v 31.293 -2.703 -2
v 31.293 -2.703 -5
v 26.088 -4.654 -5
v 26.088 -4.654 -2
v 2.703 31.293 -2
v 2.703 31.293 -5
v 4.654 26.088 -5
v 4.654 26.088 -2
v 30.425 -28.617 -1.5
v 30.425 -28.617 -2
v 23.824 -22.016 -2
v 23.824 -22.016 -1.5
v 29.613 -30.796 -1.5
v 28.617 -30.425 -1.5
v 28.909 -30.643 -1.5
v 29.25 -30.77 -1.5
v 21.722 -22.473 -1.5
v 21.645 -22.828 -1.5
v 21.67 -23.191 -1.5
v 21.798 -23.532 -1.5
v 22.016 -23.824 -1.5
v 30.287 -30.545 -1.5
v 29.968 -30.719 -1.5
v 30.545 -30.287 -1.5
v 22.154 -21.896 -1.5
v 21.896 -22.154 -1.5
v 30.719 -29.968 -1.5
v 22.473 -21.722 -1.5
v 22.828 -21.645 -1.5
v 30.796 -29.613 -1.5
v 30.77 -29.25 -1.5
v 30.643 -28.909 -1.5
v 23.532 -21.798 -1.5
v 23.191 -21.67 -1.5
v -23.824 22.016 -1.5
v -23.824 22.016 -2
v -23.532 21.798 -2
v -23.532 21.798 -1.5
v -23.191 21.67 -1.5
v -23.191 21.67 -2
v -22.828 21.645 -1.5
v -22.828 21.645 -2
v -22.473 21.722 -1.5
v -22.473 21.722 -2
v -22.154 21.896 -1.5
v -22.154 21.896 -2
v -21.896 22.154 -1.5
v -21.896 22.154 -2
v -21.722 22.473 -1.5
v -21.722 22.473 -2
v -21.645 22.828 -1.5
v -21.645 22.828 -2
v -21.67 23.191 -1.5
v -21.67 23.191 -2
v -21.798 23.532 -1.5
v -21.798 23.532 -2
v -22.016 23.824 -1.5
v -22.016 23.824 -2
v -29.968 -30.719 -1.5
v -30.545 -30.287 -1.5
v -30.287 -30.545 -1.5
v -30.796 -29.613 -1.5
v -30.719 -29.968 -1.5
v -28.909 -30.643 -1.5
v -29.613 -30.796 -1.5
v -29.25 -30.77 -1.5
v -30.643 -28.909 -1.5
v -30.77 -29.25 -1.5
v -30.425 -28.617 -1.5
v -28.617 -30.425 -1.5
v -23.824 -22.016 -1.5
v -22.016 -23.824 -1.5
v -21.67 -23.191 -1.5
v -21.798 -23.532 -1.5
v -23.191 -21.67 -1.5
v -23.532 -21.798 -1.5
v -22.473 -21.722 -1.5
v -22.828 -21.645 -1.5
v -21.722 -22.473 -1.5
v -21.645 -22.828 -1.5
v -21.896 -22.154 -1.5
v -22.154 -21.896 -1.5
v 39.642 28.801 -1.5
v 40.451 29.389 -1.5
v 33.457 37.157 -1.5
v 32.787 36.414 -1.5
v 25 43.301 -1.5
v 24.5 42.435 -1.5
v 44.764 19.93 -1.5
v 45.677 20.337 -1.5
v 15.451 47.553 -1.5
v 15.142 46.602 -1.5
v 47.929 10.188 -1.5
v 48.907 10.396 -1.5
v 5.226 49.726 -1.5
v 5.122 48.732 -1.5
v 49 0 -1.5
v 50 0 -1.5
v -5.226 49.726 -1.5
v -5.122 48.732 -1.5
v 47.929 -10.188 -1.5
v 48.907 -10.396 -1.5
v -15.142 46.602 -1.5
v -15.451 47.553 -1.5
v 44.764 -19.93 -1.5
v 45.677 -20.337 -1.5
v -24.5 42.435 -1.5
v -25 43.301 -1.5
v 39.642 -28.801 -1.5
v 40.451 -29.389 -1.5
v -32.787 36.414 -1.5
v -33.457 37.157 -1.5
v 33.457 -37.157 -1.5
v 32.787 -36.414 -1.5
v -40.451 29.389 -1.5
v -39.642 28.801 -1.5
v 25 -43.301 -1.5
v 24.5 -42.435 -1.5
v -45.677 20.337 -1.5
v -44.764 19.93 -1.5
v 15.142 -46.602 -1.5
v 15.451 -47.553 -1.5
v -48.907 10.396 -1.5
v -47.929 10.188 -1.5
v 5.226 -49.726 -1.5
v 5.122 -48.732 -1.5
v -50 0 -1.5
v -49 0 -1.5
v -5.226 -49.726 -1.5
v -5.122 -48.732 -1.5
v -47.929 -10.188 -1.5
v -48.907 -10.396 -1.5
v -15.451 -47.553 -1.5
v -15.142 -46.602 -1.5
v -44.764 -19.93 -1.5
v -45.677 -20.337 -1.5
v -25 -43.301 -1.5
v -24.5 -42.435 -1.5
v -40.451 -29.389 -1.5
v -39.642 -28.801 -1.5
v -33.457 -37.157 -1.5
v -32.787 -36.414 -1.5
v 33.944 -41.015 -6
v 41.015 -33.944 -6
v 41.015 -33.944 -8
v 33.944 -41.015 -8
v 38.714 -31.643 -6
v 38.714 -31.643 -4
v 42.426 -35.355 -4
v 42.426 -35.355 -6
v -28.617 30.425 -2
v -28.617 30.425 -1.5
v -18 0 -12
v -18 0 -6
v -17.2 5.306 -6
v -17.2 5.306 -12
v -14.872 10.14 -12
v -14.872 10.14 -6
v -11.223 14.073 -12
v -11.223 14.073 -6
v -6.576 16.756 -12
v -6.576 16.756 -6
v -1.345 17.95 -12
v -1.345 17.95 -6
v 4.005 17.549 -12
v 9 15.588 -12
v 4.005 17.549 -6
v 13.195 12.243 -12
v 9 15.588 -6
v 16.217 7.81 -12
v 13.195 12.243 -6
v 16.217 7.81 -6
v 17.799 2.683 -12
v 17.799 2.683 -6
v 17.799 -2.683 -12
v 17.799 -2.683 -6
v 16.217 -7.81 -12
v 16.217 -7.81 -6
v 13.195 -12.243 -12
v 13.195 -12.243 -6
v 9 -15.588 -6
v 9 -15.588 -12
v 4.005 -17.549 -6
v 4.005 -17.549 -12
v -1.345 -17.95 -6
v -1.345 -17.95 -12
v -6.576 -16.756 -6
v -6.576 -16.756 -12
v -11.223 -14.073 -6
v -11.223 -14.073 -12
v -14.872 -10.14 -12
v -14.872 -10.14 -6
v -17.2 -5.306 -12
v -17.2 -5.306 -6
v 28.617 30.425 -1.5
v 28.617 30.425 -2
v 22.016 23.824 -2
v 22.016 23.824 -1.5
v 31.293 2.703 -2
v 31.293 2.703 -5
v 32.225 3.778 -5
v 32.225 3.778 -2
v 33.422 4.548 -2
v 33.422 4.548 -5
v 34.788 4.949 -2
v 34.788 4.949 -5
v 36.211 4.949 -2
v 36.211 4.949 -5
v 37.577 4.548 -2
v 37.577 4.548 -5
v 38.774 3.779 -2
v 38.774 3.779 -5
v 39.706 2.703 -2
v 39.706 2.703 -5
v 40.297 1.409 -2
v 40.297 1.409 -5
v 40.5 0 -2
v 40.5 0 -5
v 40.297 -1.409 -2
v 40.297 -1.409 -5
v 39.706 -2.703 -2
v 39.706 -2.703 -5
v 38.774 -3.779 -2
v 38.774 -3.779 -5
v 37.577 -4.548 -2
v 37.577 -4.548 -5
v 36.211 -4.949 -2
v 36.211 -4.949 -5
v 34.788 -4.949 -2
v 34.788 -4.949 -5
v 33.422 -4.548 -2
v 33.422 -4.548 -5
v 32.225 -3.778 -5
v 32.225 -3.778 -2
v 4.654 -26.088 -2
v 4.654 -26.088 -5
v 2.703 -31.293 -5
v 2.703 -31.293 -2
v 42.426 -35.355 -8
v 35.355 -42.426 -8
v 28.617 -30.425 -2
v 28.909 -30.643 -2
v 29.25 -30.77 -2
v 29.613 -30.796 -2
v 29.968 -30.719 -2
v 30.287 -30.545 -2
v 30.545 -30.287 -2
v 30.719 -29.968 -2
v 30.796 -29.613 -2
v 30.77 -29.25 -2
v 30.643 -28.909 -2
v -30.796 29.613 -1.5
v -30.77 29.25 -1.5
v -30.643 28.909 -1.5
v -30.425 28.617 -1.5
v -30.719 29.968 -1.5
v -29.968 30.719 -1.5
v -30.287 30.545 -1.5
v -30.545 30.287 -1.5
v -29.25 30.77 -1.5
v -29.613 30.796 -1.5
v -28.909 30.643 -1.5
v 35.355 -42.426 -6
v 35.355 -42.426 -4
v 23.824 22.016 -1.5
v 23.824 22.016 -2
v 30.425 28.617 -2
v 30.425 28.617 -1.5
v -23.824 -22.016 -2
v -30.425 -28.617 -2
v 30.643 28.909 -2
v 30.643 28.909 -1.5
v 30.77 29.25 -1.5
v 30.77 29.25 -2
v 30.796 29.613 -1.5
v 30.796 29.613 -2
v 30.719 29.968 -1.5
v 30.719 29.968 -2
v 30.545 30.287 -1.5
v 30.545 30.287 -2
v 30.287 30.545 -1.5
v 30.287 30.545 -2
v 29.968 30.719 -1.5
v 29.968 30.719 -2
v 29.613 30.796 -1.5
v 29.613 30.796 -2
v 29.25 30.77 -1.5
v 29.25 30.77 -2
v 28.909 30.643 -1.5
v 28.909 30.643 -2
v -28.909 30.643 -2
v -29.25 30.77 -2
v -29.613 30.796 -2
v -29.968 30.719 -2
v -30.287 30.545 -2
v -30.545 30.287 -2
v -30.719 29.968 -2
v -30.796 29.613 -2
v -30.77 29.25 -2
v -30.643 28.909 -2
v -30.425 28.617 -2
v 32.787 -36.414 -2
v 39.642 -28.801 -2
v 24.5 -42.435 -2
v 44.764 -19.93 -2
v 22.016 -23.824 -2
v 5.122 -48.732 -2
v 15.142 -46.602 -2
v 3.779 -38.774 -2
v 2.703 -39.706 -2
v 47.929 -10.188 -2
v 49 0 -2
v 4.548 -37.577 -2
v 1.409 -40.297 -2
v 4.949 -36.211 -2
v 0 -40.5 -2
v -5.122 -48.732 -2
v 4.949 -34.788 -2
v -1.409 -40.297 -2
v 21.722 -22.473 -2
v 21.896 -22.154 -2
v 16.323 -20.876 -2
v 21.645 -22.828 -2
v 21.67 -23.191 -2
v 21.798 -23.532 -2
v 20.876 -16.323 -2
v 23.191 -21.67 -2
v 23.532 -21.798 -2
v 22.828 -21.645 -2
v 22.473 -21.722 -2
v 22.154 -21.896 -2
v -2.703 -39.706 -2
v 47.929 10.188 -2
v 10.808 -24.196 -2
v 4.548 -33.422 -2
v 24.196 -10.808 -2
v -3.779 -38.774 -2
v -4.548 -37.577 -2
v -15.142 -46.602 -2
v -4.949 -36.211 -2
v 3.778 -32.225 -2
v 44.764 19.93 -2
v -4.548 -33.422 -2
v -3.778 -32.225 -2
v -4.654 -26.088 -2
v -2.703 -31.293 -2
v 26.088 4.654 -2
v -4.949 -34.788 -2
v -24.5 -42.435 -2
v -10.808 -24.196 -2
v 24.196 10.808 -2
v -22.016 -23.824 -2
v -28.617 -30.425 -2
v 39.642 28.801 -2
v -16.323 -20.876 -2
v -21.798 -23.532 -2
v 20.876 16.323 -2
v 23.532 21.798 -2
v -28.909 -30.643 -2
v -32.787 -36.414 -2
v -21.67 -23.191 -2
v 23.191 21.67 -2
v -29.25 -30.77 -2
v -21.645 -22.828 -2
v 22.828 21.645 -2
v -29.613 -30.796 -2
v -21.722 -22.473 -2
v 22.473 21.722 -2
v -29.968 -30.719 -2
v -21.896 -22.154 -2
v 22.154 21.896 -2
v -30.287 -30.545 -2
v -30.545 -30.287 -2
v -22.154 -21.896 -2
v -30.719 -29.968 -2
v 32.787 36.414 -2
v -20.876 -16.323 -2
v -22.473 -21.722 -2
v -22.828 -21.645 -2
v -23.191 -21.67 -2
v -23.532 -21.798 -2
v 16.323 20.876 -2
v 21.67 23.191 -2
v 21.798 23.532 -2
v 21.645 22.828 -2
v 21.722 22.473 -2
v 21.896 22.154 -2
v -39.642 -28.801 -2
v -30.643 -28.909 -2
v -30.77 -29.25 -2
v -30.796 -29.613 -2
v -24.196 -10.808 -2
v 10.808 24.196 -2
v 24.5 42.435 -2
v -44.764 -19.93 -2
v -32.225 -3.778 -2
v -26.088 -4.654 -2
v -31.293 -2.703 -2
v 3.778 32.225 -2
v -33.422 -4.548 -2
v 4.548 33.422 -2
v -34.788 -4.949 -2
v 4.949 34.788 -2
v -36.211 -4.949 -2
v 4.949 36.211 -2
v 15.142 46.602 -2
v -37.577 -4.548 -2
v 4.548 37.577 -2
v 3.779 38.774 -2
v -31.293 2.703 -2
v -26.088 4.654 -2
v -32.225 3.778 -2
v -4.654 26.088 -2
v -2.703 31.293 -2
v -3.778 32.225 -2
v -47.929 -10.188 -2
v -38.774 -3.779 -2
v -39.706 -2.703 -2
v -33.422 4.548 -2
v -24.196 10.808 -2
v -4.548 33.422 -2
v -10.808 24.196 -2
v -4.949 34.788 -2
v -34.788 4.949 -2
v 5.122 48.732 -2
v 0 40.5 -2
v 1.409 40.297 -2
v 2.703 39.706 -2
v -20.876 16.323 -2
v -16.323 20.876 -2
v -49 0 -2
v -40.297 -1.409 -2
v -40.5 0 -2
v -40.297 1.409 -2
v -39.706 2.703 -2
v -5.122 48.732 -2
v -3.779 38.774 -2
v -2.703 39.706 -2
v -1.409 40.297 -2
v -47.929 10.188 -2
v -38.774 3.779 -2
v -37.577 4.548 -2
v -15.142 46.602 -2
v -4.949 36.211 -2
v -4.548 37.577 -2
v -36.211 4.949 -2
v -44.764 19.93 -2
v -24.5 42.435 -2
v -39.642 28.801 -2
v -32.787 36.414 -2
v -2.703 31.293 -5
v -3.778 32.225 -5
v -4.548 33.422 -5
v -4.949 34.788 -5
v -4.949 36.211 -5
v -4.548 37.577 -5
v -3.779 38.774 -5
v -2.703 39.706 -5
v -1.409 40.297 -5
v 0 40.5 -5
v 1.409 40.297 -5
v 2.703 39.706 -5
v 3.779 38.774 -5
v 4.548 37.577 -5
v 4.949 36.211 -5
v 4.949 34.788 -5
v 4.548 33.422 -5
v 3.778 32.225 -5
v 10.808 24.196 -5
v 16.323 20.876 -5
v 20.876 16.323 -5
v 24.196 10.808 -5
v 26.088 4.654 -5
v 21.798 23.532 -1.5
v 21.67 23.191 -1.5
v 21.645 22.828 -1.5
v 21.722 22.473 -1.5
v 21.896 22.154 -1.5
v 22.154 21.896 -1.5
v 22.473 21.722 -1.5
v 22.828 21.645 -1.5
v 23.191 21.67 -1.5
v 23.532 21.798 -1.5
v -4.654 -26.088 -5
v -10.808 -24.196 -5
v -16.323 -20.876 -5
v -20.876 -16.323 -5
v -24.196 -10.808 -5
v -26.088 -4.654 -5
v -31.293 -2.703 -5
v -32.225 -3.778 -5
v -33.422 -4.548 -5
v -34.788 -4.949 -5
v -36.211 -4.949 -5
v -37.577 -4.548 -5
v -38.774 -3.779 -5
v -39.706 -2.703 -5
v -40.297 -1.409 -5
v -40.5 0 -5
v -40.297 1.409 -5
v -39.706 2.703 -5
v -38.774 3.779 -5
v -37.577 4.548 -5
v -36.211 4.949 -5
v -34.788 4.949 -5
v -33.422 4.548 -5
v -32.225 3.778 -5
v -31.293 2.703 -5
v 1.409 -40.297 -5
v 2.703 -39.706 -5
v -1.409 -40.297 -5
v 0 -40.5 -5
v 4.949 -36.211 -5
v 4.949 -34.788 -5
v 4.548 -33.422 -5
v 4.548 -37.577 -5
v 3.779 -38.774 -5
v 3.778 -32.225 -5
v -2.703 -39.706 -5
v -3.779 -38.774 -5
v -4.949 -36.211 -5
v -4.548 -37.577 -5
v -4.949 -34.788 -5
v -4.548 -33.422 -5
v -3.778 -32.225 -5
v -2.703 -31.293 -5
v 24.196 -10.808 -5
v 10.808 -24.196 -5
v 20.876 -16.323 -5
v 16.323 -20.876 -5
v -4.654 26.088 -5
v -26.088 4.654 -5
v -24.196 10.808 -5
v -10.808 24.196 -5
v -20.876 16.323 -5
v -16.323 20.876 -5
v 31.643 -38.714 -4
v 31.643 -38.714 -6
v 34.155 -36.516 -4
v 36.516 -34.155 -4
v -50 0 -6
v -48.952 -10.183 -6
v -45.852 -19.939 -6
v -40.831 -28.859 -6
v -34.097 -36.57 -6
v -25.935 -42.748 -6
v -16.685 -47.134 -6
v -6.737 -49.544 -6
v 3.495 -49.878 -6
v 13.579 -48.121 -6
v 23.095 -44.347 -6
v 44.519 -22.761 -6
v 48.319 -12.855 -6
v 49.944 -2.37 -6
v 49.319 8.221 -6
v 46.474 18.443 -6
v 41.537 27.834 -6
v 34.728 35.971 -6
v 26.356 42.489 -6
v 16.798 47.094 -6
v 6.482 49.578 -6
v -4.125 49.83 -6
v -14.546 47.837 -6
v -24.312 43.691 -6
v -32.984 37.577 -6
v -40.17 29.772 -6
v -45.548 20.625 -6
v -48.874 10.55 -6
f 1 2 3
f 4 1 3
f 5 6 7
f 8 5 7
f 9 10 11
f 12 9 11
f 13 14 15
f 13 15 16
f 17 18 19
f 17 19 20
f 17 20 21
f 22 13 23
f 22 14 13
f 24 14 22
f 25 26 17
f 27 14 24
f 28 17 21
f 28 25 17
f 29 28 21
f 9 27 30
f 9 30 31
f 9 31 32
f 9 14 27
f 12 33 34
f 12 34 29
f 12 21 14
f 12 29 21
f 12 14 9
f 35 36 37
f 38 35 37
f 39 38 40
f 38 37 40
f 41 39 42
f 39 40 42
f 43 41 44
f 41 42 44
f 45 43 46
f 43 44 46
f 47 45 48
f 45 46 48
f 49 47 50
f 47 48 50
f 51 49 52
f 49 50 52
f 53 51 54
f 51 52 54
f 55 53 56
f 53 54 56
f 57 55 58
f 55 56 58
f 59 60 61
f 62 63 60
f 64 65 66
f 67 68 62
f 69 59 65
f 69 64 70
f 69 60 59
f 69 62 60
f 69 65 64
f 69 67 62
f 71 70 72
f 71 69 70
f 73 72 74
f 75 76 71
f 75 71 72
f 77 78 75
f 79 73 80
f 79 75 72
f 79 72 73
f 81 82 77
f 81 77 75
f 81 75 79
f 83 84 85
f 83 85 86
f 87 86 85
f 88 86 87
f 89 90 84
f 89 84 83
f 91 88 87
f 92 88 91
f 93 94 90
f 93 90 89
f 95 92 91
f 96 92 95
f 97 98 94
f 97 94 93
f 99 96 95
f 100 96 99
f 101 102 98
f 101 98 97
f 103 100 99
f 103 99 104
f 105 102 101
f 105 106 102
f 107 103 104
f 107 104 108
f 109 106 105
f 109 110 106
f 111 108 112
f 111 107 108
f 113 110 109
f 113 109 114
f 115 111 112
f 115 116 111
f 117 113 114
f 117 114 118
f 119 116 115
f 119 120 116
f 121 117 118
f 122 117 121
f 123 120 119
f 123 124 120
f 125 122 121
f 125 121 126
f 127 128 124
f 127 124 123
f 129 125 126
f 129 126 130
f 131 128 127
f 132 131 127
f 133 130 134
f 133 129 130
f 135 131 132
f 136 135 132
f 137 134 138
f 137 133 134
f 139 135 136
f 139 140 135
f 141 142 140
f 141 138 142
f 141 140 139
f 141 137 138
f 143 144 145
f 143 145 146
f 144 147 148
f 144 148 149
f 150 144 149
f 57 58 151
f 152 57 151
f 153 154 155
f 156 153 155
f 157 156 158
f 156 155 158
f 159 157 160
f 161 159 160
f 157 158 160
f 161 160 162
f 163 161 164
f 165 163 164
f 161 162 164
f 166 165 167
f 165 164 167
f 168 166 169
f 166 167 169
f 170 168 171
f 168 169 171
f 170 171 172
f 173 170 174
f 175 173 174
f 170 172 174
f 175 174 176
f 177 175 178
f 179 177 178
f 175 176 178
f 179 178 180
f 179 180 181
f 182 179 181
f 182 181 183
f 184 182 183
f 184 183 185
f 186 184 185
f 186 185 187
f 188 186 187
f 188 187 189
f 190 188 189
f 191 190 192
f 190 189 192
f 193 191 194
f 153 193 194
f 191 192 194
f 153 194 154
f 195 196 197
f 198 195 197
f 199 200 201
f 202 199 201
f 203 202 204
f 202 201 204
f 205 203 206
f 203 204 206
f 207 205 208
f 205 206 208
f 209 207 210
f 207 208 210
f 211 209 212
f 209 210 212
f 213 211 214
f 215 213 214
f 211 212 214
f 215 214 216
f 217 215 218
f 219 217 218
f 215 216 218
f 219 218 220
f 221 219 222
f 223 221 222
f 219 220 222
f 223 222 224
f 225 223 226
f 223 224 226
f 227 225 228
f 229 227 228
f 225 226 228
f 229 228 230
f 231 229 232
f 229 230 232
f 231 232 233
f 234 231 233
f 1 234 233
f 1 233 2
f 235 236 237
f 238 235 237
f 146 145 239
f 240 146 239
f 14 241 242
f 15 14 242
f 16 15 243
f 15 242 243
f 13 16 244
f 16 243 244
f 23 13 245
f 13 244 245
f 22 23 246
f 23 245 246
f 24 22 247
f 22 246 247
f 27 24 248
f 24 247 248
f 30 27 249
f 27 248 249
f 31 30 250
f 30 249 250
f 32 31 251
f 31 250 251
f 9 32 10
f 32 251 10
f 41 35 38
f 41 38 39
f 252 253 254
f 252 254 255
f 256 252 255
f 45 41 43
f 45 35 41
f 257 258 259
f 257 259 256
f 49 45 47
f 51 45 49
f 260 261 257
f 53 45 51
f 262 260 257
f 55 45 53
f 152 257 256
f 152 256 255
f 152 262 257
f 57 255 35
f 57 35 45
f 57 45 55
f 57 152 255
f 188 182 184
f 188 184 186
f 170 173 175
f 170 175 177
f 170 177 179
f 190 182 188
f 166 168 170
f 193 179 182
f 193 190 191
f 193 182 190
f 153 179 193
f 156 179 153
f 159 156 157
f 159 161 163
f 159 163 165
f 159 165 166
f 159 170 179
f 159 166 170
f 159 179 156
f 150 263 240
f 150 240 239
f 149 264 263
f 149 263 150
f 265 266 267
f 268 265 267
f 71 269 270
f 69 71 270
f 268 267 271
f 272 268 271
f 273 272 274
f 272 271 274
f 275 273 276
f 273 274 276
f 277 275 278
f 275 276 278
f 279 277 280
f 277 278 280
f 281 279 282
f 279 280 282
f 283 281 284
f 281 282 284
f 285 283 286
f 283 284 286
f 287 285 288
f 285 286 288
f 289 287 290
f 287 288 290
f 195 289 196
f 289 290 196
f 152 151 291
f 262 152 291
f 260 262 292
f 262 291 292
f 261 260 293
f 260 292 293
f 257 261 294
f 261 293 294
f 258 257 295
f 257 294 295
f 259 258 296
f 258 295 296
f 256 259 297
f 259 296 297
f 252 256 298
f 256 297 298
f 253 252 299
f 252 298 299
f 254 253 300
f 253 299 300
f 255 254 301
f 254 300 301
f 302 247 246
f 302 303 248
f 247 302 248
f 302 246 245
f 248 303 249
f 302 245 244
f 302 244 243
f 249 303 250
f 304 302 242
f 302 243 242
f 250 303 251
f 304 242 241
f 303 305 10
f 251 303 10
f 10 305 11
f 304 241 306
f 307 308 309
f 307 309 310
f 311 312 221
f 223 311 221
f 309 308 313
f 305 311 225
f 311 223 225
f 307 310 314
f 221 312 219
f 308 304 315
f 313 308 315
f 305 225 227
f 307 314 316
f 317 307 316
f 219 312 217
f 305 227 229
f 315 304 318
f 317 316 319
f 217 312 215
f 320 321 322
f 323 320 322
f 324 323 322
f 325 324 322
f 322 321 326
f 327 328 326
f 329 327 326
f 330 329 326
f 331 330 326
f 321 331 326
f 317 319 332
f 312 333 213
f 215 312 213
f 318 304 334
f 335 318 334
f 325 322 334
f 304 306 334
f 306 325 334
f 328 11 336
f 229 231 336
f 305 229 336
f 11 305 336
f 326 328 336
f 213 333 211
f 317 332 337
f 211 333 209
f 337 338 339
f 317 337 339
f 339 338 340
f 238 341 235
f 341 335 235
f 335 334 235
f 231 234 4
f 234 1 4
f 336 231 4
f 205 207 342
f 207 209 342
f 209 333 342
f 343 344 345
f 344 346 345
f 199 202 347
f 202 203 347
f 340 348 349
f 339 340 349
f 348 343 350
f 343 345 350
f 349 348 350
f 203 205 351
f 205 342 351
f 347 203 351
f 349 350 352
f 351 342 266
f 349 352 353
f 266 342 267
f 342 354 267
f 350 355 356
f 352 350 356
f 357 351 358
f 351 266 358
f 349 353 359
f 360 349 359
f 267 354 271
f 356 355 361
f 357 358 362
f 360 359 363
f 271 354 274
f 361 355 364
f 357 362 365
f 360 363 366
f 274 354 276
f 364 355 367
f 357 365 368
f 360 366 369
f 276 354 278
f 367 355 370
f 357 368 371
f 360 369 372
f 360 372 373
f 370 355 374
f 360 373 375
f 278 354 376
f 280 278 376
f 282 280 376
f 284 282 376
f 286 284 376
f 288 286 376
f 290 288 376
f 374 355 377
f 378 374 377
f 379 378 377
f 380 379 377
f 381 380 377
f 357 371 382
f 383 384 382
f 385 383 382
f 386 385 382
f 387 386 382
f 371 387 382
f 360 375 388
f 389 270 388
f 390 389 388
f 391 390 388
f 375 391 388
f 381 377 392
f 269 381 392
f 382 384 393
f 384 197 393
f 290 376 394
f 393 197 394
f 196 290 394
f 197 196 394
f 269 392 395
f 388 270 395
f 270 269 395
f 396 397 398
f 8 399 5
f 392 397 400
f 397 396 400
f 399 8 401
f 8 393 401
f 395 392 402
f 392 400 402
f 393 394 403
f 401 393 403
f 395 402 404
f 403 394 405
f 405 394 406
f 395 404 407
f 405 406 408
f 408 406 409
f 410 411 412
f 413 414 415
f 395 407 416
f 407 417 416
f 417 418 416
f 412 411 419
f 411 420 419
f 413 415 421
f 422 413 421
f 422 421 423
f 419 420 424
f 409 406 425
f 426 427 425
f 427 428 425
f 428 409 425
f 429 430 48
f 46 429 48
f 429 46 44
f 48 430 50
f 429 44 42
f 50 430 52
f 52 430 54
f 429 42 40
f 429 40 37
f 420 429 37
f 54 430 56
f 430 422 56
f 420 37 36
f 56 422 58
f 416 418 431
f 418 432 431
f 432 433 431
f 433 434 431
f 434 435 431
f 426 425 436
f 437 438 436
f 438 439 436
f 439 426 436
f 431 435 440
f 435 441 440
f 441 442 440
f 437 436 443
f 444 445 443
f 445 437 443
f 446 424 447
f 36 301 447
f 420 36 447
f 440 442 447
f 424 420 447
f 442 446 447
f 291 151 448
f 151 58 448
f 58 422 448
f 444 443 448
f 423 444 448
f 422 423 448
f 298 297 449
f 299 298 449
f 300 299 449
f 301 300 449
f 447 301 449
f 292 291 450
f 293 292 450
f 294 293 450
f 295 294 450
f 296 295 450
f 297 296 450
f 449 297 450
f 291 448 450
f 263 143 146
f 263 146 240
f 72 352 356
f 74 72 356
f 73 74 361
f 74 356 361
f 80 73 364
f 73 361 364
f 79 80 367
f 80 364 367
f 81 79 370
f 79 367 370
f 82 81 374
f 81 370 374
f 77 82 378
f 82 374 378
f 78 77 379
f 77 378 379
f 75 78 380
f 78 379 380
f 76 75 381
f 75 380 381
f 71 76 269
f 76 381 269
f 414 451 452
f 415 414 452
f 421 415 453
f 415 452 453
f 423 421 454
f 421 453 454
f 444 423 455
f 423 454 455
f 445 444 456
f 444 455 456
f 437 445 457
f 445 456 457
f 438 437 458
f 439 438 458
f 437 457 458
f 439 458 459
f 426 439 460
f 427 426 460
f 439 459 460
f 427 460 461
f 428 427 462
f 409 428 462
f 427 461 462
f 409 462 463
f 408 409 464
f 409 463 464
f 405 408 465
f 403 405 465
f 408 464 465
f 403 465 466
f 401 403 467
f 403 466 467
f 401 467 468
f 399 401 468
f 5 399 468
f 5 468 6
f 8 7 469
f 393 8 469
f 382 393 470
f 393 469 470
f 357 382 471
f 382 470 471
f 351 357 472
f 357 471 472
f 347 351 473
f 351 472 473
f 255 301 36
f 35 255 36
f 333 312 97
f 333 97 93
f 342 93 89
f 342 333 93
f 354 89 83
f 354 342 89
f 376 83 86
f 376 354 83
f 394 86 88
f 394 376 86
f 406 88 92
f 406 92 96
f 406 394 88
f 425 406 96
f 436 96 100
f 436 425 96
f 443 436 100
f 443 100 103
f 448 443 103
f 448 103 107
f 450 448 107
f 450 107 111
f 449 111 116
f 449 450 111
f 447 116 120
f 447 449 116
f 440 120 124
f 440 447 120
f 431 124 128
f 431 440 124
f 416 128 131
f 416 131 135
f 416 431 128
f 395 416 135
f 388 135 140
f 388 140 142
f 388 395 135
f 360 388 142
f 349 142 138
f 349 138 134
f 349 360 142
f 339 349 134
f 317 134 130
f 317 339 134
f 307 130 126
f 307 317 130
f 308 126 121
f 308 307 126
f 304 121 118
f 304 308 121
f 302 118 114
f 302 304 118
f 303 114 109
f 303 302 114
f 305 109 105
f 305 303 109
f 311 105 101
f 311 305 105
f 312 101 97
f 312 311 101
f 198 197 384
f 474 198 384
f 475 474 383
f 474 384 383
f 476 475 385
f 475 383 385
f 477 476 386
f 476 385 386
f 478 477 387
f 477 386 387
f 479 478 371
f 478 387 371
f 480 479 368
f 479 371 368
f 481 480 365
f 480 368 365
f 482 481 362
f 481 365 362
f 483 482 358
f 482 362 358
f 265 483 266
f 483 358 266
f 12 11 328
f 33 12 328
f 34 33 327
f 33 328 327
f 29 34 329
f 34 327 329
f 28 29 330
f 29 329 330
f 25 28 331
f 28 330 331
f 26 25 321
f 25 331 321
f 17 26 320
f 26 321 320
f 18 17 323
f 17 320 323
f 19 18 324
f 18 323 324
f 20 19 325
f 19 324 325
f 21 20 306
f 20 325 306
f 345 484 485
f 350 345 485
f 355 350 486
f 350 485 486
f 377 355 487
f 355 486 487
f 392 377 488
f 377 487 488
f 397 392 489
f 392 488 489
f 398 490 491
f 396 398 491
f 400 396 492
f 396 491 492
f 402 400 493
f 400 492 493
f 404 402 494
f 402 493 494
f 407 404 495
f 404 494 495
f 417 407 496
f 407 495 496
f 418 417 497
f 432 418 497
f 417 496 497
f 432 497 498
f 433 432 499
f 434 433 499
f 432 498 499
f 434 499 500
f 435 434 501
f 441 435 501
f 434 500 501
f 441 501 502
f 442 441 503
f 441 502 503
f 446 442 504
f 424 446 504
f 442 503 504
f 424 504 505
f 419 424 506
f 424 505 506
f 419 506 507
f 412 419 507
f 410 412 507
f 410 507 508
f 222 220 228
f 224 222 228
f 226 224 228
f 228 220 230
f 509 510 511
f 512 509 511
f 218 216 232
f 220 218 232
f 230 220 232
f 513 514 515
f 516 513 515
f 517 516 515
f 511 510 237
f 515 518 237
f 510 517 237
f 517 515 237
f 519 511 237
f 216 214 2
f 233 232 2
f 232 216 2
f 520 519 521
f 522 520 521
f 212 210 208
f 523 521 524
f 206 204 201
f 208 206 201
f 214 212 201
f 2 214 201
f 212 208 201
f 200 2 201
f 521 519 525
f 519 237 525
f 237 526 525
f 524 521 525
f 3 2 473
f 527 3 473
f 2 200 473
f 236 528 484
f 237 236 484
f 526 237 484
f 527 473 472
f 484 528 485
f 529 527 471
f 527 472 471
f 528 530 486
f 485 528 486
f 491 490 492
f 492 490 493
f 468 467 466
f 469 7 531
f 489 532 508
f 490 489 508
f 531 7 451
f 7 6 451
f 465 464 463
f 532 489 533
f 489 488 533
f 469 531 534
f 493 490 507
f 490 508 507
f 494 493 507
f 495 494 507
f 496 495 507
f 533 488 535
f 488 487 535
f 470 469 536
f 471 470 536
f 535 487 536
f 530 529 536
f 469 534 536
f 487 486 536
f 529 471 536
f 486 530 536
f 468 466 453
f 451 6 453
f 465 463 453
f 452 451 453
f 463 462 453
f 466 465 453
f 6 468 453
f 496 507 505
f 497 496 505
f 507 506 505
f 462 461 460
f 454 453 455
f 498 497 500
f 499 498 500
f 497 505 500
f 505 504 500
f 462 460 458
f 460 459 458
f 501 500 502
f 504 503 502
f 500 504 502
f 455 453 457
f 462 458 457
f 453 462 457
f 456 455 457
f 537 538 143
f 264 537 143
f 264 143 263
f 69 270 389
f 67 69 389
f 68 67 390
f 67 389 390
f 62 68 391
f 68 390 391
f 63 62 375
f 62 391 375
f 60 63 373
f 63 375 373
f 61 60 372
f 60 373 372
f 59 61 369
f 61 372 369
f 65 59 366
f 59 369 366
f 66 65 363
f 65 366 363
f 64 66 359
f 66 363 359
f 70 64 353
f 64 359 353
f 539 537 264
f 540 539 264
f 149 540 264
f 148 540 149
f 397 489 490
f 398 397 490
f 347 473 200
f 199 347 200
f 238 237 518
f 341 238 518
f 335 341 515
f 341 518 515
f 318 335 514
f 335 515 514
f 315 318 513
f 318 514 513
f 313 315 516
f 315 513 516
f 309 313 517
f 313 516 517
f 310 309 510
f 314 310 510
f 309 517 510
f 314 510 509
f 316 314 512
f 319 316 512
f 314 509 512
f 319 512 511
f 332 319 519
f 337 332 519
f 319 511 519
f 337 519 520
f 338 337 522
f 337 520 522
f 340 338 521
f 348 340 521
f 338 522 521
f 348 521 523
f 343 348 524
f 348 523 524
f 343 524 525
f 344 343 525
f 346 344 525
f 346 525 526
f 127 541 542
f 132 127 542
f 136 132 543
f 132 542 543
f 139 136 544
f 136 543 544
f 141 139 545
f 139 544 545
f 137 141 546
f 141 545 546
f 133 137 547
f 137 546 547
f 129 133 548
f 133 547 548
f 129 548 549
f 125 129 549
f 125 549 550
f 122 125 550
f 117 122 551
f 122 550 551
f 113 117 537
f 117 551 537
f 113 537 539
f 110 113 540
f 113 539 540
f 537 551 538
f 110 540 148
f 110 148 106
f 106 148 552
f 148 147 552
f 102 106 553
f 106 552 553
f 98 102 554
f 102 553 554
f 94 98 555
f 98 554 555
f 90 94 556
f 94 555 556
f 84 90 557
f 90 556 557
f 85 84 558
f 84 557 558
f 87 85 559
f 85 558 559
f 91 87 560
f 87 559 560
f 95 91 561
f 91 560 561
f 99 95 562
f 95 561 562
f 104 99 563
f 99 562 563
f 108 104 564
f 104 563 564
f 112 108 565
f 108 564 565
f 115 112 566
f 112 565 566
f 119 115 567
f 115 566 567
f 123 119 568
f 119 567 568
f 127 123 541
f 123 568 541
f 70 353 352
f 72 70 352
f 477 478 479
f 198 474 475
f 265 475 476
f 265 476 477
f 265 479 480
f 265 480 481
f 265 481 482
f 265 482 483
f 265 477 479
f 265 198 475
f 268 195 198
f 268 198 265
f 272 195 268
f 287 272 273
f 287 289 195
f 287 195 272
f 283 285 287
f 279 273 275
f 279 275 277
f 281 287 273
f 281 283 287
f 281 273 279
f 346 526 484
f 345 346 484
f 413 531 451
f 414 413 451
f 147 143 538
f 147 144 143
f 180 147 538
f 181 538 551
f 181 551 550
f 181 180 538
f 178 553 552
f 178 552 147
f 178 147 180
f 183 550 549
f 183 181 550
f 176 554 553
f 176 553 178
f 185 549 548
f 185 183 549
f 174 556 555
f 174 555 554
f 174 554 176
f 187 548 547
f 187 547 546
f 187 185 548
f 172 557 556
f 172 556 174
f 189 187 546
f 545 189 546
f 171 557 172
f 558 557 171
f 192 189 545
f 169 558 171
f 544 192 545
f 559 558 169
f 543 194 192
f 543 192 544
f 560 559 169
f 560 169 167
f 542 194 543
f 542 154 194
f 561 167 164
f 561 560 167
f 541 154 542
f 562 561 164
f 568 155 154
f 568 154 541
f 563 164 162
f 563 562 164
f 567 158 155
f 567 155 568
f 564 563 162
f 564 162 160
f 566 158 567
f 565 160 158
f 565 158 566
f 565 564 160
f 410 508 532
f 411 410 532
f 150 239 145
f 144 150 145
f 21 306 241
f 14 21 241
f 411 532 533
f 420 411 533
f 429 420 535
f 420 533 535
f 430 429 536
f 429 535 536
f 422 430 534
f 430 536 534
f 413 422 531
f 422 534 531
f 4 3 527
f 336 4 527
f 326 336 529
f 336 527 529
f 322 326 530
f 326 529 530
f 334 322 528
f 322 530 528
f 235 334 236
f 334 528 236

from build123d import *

# Parameters (mm, degrees)
CROQUIS2_R              = 50
SALIENTE_EXTRUIR2_DEPTH = 3
SALIENTE_EXTRUIR3_START = 1
CROQUIS3_R              = 50
SALIENTE_EXTRUIR3_DEPTH = 1
CROQUIS4_R              = 18
SALIENTE_EXTRUIR4_DEPTH = 6
CROQUIS5_R              = 50
CROQUIS5_R_2            = 49
SALIENTE_EXTRUIR5_DEPTH = 0.5
SALIENTE_EXTRUIR6_DEPTH = 2
SALIENTE_EXTRUIR7_DEPTH = 2


with BuildPart() as part:
    # Croquis2 → Saliente-Extruir2 (new body)
    with BuildSketch(Plane(origin=(0, 0, -5), x_dir=(-1, 0, 0), z_dir=(0, 0, -1))):
        Circle(CROQUIS2_R)
        with BuildLine():
            Line((-26.088038734, 4.654485475), (-31.293290297, 2.702516138))
            ThreePointArc((-31.293290297, 2.702516138), (-40.5, 0), (-31.293290297, -2.702516138))
            Line((-31.293290297, -2.702516138), (-26.088038734, -4.654485475))
            ThreePointArc((-26.088038734, -4.654485475), (-18.738329701, -18.738329701), (-4.654485475, -26.088038734))
            Line((-4.654485475, -26.088038734), (-2.702516138, -31.293290297))
            ThreePointArc((-2.702516138, -31.293290297), (0, -40.5), (2.702516138, -31.293290297))
            Line((2.702516138, -31.293290297), (4.654485475, -26.088038734))
            ThreePointArc((4.654485475, -26.088038734), (18.738329701, -18.738329701), (26.088038734, -4.654485475))
            Line((26.088038734, -4.654485475), (31.293290297, -2.702516138))
            ThreePointArc((31.293290297, -2.702516138), (40.5, 0), (31.293290297, 2.702516138))
            Line((31.293290297, 2.702516138), (26.088038734, 4.654485475))
            ThreePointArc((26.088038734, 4.654485475), (18.738329701, 18.738329701), (4.654485475, 26.088038734))
            Line((4.654485475, 26.088038734), (2.702516138, 31.293290297))
            ThreePointArc((2.702516138, 31.293290297), (0, 40.5), (-2.702516138, 31.293290297))
            Line((-2.702516138, 31.293290297), (-4.654485475, 26.088038734))
            ThreePointArc((-4.654485475, 26.088038734), (-18.738329701, 18.738329701), (-26.088038734, 4.654485475))
        make_face(mode=Mode.SUBTRACT)
    extrude(amount=-SALIENTE_EXTRUIR2_DEPTH)

    # Croquis3 → Saliente-Extruir3 (add)
    with BuildSketch(Plane(origin=(0, 0, -5), x_dir=(-1, 0, 0), z_dir=(0, 0, -1)).offset(SALIENTE_EXTRUIR3_START)):
        Circle(CROQUIS3_R)
    extrude(amount=-SALIENTE_EXTRUIR3_DEPTH)

    # Croquis4 → Saliente-Extruir4 (add)
    with BuildSketch(Plane(origin=(0, 0, -6), x_dir=(-1, 0, 0), z_dir=(0, 0, -1))):
        Circle(CROQUIS4_R)
    extrude(amount=SALIENTE_EXTRUIR4_DEPTH)

    # Croquis5 → Saliente-Extruir5 (add)
    # profile 1 of 5: a face of its own
    with BuildSketch(Plane.XY.offset(-2)):
        with Locations(Location((0, 0, 0), (0, 0, 180))):
            Circle(CROQUIS5_R)
        Circle(CROQUIS5_R_2, mode=Mode.SUBTRACT)
    # profile 2 of 5: a face of its own
    with BuildSketch(Plane.XY.offset(-2)):
        with BuildLine():
            Line((-30.425241187, 28.617399842), (-23.823505496, 22.01566415))
            ThreePointArc((-23.823505496, 22.01566415), (-22.01566415, 22.01566415), (-22.01566415, 23.823505496))
            Line((-22.01566415, 23.823505496), (-28.617399842, 30.425241187))
            ThreePointArc((-28.617399842, 30.425241187), (-30.425241187, 30.425241187), (-30.425241187, 28.617399842))
        make_face()
    # profile 3 of 5: a face of its own
    with BuildSketch(Plane.XY.offset(-2)):
        with BuildLine():
            Line((30.425241187, -28.617399842), (23.823505496, -22.01566415))
            ThreePointArc((23.823505496, -22.01566415), (22.01566415, -22.01566415), (22.01566415, -23.823505496))
            Line((22.01566415, -23.823505496), (28.617399842, -30.425241187))
            ThreePointArc((28.617399842, -30.425241187), (30.425241187, -30.425241187), (30.425241187, -28.617399842))
        make_face()
    # profile 4 of 5: a face of its own
    with BuildSketch(Plane.XY.offset(-2)):
        with BuildLine():
            Line((-28.617399842, -30.425241187), (-22.01566415, -23.823505496))
            ThreePointArc((-22.01566415, -23.823505496), (-22.01566415, -22.01566415), (-23.823505496, -22.01566415))
            Line((-23.823505496, -22.01566415), (-30.425241187, -28.617399842))
            ThreePointArc((-30.425241187, -28.617399842), (-30.425241187, -30.425241187), (-28.617399842, -30.425241187))
        make_face()
    # profile 5 of 5: a face of its own
    with BuildSketch(Plane.XY.offset(-2)):
        with BuildLine():
            Line((28.617399842, 30.425241187), (22.01566415, 23.823505496))
            ThreePointArc((22.01566415, 23.823505496), (22.01566415, 22.01566415), (23.823505496, 22.01566415))
            Line((23.823505496, 22.01566415), (30.425241187, 28.617399842))
            ThreePointArc((30.425241187, 28.617399842), (30.425241187, 30.425241187), (28.617399842, 30.425241187))
        make_face()
    extrude(amount=SALIENTE_EXTRUIR5_DEPTH)

    # Croquis6 → Saliente-Extruir6 (add)
    with BuildSketch(Plane(origin=(0, 0, -6), x_dir=(-1, 0, 0), z_dir=(0, 0, -1))):
        Polygon((-30.318233872, -37.389301684), (-35.355339059, -42.426406871), (-42.426406871, -35.355339059), (-38.890872965, -31.819805153), (-37.389301684, -30.318233872), align=None)
    extrude(amount=-SALIENTE_EXTRUIR6_DEPTH)

    # Croquis7 → Saliente-Extruir7 (add)
    with BuildSketch(Plane(origin=(0, 0, -6), x_dir=(-1, 0, 0), z_dir=(0, 0, -1))):
        Polygon((-42.426406871, -35.355339059), (-41.014653165, -33.943585354), (-33.943585354, -41.014653165), (-35.355339059, -42.426406871), align=None)
    extrude(amount=SALIENTE_EXTRUIR7_DEPTH)


solid = part.part
